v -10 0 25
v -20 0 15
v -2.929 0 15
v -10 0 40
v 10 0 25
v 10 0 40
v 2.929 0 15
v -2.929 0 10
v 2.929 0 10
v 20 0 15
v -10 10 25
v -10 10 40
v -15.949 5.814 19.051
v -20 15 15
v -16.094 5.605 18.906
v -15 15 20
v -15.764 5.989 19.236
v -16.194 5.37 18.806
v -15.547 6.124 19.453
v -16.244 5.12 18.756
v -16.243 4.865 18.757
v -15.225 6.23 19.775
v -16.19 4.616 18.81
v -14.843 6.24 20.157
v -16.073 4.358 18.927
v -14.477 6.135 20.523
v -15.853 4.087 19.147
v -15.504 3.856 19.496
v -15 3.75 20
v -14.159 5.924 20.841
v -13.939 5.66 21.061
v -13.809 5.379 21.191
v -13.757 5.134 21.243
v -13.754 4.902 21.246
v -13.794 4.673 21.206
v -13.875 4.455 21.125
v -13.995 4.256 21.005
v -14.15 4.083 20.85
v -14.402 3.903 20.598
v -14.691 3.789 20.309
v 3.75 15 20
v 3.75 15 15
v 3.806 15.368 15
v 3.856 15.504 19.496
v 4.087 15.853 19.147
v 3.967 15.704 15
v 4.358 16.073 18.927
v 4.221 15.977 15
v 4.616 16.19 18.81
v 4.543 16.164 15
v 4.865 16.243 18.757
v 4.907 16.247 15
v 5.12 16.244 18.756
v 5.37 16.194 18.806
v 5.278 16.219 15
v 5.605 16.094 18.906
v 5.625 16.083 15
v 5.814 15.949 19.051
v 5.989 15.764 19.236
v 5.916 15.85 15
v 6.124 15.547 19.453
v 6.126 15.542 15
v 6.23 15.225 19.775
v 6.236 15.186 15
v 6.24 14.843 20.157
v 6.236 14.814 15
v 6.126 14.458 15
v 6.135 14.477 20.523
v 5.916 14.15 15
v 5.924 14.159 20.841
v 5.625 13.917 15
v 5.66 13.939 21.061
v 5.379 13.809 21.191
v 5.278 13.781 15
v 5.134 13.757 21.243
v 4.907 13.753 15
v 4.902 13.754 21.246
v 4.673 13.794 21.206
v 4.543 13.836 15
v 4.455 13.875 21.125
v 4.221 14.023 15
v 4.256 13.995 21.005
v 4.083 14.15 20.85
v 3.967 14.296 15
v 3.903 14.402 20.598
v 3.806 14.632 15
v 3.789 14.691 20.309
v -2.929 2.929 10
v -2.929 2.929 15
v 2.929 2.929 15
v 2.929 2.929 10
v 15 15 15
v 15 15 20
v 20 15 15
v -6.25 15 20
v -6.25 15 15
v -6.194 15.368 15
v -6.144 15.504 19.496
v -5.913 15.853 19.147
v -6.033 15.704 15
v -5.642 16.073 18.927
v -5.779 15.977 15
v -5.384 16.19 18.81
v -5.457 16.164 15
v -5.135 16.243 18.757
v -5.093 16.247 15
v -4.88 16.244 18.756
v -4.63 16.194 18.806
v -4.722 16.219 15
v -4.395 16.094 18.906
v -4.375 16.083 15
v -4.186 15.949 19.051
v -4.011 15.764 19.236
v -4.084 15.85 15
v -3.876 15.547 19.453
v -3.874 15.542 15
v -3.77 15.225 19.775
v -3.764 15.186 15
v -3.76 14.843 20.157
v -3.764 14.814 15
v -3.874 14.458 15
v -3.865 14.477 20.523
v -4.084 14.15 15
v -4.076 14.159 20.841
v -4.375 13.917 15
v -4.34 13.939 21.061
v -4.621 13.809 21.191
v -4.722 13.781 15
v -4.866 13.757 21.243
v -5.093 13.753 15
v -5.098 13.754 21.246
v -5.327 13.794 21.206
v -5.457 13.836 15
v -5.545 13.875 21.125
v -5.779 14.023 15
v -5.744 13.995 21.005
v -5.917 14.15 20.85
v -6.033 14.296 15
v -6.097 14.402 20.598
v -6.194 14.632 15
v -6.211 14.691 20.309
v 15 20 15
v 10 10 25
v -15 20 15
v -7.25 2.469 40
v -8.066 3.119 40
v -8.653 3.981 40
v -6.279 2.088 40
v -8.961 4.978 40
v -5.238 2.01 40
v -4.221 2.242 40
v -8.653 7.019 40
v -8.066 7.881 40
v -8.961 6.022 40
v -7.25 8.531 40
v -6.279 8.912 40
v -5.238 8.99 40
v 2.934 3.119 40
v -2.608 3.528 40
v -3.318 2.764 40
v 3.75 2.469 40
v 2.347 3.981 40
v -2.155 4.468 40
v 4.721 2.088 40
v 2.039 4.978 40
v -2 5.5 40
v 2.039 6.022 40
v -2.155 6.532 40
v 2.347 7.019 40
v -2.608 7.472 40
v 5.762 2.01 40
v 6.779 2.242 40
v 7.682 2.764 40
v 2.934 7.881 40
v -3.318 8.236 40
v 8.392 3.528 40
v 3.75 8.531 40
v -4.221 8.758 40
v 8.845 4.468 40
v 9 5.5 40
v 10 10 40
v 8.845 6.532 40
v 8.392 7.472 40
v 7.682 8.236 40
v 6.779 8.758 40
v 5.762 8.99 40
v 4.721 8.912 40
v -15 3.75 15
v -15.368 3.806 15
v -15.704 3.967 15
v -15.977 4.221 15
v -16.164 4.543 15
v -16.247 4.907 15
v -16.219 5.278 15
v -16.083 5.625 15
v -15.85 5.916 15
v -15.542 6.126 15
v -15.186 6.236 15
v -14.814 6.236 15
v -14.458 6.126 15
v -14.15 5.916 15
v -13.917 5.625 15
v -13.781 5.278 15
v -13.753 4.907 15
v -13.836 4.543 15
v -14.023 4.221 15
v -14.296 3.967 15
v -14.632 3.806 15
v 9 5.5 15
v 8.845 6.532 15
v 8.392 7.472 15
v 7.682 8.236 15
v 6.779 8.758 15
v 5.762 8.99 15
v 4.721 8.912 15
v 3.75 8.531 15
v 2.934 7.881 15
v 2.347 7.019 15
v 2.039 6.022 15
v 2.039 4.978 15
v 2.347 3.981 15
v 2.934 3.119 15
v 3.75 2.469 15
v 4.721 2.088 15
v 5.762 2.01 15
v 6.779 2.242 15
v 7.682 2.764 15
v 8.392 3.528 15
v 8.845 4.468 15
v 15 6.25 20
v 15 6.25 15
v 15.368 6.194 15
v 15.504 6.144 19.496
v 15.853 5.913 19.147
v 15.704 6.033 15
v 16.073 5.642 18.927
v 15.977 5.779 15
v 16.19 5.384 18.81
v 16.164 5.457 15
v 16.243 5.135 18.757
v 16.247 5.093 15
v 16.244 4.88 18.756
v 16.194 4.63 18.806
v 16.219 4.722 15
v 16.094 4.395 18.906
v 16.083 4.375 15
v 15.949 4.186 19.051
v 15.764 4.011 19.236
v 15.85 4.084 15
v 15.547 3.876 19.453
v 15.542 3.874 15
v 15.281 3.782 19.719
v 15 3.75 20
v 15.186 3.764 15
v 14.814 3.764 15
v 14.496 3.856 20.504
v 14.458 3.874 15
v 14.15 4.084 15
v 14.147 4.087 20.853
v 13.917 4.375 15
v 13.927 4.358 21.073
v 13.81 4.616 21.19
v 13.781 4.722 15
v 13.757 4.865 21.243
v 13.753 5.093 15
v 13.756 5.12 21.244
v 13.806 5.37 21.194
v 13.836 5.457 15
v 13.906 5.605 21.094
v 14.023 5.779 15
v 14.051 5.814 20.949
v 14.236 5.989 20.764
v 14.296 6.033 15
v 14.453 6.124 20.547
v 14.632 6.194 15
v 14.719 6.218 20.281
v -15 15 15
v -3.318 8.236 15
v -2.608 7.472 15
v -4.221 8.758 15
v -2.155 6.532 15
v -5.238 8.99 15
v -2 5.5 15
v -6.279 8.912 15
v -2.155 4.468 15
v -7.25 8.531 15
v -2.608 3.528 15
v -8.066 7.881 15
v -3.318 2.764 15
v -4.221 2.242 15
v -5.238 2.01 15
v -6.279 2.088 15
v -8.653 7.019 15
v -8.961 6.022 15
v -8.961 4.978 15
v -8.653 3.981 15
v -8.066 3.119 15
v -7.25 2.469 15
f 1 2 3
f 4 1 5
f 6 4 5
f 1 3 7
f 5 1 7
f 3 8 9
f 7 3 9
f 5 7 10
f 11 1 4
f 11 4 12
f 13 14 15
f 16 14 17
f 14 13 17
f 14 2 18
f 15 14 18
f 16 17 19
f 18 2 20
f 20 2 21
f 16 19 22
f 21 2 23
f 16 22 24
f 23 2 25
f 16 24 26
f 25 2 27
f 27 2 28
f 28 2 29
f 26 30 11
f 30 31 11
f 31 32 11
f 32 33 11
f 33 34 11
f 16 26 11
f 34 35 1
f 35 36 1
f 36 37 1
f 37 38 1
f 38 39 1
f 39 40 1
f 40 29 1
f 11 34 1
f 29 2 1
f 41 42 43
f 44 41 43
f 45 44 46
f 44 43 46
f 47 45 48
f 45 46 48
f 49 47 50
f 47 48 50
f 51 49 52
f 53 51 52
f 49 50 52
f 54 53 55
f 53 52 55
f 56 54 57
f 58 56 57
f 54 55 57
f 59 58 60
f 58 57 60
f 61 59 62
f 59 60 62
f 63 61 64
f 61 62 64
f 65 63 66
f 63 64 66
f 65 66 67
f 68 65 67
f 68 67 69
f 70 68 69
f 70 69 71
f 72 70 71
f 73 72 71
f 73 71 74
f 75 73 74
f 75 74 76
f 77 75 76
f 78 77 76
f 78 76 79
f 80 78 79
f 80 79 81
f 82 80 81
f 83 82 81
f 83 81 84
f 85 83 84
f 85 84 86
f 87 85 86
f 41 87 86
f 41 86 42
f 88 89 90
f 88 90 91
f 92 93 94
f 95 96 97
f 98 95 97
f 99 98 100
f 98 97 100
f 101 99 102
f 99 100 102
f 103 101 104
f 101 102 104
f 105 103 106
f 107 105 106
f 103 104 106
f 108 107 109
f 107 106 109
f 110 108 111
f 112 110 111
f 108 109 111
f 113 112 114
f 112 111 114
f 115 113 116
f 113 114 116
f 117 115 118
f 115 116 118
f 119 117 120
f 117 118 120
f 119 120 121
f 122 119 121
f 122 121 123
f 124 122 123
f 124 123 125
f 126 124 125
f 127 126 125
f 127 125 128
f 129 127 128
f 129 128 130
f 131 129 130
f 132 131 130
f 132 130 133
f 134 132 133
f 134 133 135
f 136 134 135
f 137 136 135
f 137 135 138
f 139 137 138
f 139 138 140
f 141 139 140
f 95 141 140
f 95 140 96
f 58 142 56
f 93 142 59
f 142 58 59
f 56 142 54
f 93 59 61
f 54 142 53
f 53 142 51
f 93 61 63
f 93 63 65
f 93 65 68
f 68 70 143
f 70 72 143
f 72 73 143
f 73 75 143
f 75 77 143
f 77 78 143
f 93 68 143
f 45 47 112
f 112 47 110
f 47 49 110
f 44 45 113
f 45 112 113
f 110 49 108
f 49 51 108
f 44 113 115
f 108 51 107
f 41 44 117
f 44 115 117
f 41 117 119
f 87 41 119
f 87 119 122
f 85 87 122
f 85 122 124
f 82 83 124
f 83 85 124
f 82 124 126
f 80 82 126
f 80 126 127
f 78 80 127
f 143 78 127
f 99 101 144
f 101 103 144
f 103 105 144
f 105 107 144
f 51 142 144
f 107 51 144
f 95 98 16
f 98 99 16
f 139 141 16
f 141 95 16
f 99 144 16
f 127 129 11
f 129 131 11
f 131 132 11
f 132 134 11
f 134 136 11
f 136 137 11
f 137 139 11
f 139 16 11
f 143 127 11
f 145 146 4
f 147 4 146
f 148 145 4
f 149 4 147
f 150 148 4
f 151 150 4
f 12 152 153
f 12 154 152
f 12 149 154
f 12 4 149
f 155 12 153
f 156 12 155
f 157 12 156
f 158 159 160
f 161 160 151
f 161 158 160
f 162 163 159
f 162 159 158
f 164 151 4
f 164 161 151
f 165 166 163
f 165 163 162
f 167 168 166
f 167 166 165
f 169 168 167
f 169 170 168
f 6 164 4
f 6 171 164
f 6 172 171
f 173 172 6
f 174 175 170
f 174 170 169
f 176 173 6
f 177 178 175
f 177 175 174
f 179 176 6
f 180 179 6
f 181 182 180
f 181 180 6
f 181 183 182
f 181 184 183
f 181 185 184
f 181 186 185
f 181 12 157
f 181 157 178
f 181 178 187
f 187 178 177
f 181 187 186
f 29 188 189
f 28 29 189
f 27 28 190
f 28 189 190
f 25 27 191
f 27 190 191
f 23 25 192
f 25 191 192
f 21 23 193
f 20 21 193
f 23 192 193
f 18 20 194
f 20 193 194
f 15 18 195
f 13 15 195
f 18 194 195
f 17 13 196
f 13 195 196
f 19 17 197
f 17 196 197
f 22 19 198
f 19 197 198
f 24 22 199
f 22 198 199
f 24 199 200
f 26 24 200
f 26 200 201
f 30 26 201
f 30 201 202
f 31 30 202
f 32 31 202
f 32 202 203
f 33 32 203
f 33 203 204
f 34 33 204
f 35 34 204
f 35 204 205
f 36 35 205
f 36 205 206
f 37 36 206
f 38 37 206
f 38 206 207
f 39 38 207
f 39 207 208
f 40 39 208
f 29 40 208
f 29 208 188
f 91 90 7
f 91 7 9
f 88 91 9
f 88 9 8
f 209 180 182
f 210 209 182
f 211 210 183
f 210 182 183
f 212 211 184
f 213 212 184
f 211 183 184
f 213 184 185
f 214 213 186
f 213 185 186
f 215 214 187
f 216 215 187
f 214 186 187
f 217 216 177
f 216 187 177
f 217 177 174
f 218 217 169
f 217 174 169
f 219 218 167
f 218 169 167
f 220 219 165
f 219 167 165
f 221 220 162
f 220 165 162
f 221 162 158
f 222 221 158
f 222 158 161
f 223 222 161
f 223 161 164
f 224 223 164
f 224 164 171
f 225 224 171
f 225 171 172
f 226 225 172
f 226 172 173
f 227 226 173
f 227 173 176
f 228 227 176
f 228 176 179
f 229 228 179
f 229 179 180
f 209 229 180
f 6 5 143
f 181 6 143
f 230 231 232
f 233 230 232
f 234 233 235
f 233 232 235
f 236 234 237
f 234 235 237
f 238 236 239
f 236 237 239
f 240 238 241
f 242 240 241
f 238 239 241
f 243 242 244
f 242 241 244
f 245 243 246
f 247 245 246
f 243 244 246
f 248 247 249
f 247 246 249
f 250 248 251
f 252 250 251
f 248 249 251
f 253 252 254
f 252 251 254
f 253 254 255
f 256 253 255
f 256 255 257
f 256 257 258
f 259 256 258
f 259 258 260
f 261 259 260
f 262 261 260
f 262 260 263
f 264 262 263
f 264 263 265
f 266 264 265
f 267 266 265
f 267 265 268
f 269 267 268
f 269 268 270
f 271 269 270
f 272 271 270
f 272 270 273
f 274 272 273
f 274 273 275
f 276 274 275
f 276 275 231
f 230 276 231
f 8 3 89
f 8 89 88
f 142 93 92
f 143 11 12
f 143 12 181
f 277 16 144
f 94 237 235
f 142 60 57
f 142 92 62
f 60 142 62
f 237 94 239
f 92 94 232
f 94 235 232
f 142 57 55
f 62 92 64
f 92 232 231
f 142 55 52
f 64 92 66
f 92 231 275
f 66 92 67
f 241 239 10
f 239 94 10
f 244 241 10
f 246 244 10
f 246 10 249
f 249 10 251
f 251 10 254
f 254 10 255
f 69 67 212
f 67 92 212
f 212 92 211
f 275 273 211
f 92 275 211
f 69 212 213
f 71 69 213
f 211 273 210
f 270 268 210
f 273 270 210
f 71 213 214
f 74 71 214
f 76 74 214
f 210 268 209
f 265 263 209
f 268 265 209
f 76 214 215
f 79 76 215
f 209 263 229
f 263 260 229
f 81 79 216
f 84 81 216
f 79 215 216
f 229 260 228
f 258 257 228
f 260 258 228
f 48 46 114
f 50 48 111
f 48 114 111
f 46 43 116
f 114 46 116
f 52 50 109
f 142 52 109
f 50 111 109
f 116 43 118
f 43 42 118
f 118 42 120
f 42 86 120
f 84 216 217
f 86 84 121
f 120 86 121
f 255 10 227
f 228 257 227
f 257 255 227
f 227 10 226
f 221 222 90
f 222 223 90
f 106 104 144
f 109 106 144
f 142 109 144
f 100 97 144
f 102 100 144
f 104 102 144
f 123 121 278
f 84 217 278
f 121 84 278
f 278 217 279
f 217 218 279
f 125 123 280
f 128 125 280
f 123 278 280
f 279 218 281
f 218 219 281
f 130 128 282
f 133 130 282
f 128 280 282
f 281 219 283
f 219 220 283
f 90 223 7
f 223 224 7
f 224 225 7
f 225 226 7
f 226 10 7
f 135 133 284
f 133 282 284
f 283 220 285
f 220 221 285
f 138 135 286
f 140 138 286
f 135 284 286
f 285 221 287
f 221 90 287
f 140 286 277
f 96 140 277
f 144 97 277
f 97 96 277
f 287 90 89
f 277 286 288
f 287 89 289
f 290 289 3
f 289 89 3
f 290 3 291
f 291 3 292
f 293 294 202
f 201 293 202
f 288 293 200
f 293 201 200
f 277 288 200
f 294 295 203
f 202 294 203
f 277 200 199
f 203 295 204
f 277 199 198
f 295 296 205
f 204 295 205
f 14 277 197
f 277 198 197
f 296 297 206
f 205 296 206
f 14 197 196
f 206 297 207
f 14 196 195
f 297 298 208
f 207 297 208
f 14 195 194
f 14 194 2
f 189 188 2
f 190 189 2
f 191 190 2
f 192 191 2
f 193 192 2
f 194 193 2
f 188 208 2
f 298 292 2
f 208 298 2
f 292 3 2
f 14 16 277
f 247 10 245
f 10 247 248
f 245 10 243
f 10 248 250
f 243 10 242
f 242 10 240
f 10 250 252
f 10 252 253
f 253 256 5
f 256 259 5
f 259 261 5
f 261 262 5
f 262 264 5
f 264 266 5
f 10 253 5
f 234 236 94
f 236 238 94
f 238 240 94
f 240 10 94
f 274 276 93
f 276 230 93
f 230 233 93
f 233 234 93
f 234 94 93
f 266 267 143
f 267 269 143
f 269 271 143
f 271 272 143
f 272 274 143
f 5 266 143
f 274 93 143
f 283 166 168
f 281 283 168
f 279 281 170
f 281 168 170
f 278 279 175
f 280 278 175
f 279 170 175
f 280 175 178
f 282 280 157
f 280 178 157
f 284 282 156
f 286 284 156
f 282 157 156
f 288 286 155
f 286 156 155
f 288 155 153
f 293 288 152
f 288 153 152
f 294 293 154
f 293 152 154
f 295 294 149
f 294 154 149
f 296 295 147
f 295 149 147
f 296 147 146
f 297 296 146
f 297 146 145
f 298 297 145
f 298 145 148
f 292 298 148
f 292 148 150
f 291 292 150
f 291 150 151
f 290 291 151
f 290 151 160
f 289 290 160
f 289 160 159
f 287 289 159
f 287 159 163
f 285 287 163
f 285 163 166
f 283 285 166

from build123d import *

# Parameters (mm, degrees)
SKETCH_1_W                = 20
SKETCH_1_H                = 20
EXTRUDE_1_DEPTH           = 40
SKETCH_2_W                = 10
SKETCH_2_H                = 15
CUT_EXTRUDE_1_DEPTH       = 7.071067812
PATTERN_CIRCULAR_1_COUNT  = 4
SKETCH_5_R                = 3.5
CUT_EXTRUDE_2_DEPTH       = 25
CUT_EXTRUDE_3_DEPTH       = 5
SKETCH_9_W                = 5.878932188
SKETCH_9_H                = 5.878932188
CUT_EXTRUDE_5_DEPTH       = 5
SKETCH_11_W               = 10
SKETCH_11_H               = 30
EXTRUDE_2_DEPTH           = 10
CUT_EXTRUDE_6_DEPTH       = 30
SKETCH_13_R               = 1.25
CUT_EXTRUDE_7_DEPTH       = 10
PATTERN_CIRCULAR_2_COUNT  = 4
SKETCH_16_W               = 20
SKETCH_16_H               = 10
CUT_EXTRUDE_11_DEPTH      = 40
SKETCH_17_W               = 20
SKETCH_17_H               = 20
SKETCH_17_W_2             = 5.857864376
SKETCH_17_H_2             = 5.857864376
CUT_EXTRUDE_12_DEPTH      = 5
CUT_EXTRUDE_13_DEPTH      = 54.851648071
CUT_EXTRUDE_13_DEPTH_BACK = 10
SKETCH_19_W               = 81.536041923
SKETCH_19_H               = 68.786769913
CUT_EXTRUDE_16_DEPTH      = 400


with BuildPart() as part:
    # 스케치1 → 보스-돌출1 (new body)
    with BuildSketch(Plane.XY):
        Rectangle(SKETCH_1_W, SKETCH_1_H)
    extrude(amount=EXTRUDE_1_DEPTH)

    # 스케치2 → 컷-돌출1 (cut)
    with BuildSketch(Plane(origin=(10, 0, 0), x_dir=(0, 0, -1), z_dir=(1, 0, 0))):
        with Locations((-10, 0)):
            Rectangle(SKETCH_2_W, SKETCH_2_H)
    cut_extrude_1 = extrude(amount=-CUT_EXTRUDE_1_DEPTH, mode=Mode.SUBTRACT)

    # 원형 패턴1: 컷-돌출1 ×4 about axis
    pattern_circular_1_axis = Axis((0, 0, 0), (0, 0, 1))
    for i in range(1, PATTERN_CIRCULAR_1_COUNT):
        add(cut_extrude_1.rotate(pattern_circular_1_axis, i * 360 / PATTERN_CIRCULAR_1_COUNT), mode=Mode.SUBTRACT)

    # 스케치5 → 컷-돌출2 (cut)
    with BuildSketch(Plane.XY.offset(40)):
        with Locations((-5.5, 5.5)):
            Circle(SKETCH_5_R)
        with Locations((5.5, 5.5)):
            Circle(SKETCH_5_R)
        with Locations(Location((-5.5, -5.5, 0), (0, 0, 235.150095421))):
            Circle(SKETCH_5_R)
        with Locations(Location((5.5, -5.5, 0), (0, 0, 304.849904579))):
            Circle(SKETCH_5_R)
    extrude(amount=-CUT_EXTRUDE_2_DEPTH, mode=Mode.SUBTRACT)

    # 스케치6 → 컷-돌출3 (cut)
    with BuildSketch(Plane(origin=(0, 0, 0), x_dir=(-1, 0, 0), z_dir=(0, 0, -1))):
        Polygon((-14.808802863, -2.95), (-14.808802863, 2.95), (-2.95, 2.95), (-2.95, 12.360254216), (2.95, 12.360254216), (2.95, 2.95), (13.852115441, 2.95), (13.852115441, -2.95), (2.95, -2.95), (2.95, -13.975695818), (-2.95, -13.975695818), (-2.95, -2.95), align=None)
    extrude(amount=-CUT_EXTRUDE_3_DEPTH, mode=Mode.SUBTRACT)

    # 스케치9 → 컷-돌출5 (cut)
    with BuildSketch(Plane(origin=(0, 0, 5), x_dir=(-1, 0, 0), z_dir=(0, 0, -1))):
        with Locations((0.010533906, -0.010533906)):
            Rectangle(SKETCH_9_W, SKETCH_9_H)
    extrude(amount=-CUT_EXTRUDE_5_DEPTH, mode=Mode.SUBTRACT)

    # 스케치11 → 보스-돌출2 (add)
    with BuildSketch(Plane(origin=(10, 0, 0), x_dir=(0, 0, -1), z_dir=(1, 0, 0))):
        with Locations((-20, 0)):
            Rectangle(SKETCH_11_W, SKETCH_11_H)
    extrude_2 = extrude(amount=EXTRUDE_2_DEPTH)

    # 스케치12 → 컷-돌출6 (cut)
    with BuildSketch(Plane(origin=(0, 15, 0), x_dir=(1, 0, 0), z_dir=(0, 1, 0))):
        Polygon((20, -15), (10, -25), (20, -25), align=None)
    cut_extrude_6 = extrude(amount=-CUT_EXTRUDE_6_DEPTH, mode=Mode.SUBTRACT)

    # 스케치13 → 컷-돌출7 (cut)
    with BuildSketch(Plane(origin=(0, 0, 15), x_dir=(-1, 0, 0), z_dir=(0, 0, -1))):
        with Locations(Location((-15, -5, 0), (0, 0, 90))):
            Circle(SKETCH_13_R)
        with Locations(Location((-15, 5, 0), (0, 0, 90))):
            Circle(SKETCH_13_R)
    cut_extrude_7 = extrude(amount=-CUT_EXTRUDE_7_DEPTH, mode=Mode.SUBTRACT)

    # 원형 패턴2: 보스-돌출2, 컷-돌출6, 컷-돌출7 ×4 about axis
    pattern_circular_2_axis = Axis((0, 0, 0), (0, 0, 1))
    add([extrude_2.rotate(pattern_circular_2_axis, i * 360 / PATTERN_CIRCULAR_2_COUNT) for i in range(1, PATTERN_CIRCULAR_2_COUNT)])
    add([cut_extrude_6.rotate(pattern_circular_2_axis, i * 360 / PATTERN_CIRCULAR_2_COUNT) for i in range(1, PATTERN_CIRCULAR_2_COUNT)], mode=Mode.SUBTRACT)
    add([cut_extrude_7.rotate(pattern_circular_2_axis, i * 360 / PATTERN_CIRCULAR_2_COUNT) for i in range(1, PATTERN_CIRCULAR_2_COUNT)], mode=Mode.SUBTRACT)

    # 스케치16 → 컷-돌출11 (cut)
    with BuildSketch(Plane.XZ.offset(10)):
        with Locations((0, 5)):
            Rectangle(SKETCH_16_W, SKETCH_16_H)
    extrude(amount=-CUT_EXTRUDE_11_DEPTH, mode=Mode.SUBTRACT)

    # 스케치17 → 컷-돌출12 (cut)
    with BuildSketch(Plane(origin=(0, 0, 10), x_dir=(-1, 0, 0), z_dir=(0, 0, -1))):
        Rectangle(SKETCH_17_W, SKETCH_17_H)
        Rectangle(SKETCH_17_W_2, SKETCH_17_H_2, mode=Mode.SUBTRACT)
    extrude(amount=-CUT_EXTRUDE_12_DEPTH, mode=Mode.SUBTRACT)

    # 스케치18 → 컷-돌출13 (cut, two sides: drawn at the far end of the back side and taken through both)
    with BuildSketch(Plane.XZ.offset(-10).offset(-CUT_EXTRUDE_13_DEPTH_BACK)):
        Polygon((10, 25), (15, 25), (15, 20), align=None)
    extrude(amount=CUT_EXTRUDE_13_DEPTH + CUT_EXTRUDE_13_DEPTH_BACK, mode=Mode.SUBTRACT)

    # 스케치19 → 컷-돌출16 (cut)
    with BuildSketch(Plane(origin=(0, 0, 0), x_dir=(1, 0, 0), z_dir=(0, 1, 0))):
        with Locations((9.636077682, -26.334226141)):
            Rectangle(SKETCH_19_W, SKETCH_19_H)
    extrude(amount=-CUT_EXTRUDE_16_DEPTH, mode=Mode.SUBTRACT)


solid = part.part
